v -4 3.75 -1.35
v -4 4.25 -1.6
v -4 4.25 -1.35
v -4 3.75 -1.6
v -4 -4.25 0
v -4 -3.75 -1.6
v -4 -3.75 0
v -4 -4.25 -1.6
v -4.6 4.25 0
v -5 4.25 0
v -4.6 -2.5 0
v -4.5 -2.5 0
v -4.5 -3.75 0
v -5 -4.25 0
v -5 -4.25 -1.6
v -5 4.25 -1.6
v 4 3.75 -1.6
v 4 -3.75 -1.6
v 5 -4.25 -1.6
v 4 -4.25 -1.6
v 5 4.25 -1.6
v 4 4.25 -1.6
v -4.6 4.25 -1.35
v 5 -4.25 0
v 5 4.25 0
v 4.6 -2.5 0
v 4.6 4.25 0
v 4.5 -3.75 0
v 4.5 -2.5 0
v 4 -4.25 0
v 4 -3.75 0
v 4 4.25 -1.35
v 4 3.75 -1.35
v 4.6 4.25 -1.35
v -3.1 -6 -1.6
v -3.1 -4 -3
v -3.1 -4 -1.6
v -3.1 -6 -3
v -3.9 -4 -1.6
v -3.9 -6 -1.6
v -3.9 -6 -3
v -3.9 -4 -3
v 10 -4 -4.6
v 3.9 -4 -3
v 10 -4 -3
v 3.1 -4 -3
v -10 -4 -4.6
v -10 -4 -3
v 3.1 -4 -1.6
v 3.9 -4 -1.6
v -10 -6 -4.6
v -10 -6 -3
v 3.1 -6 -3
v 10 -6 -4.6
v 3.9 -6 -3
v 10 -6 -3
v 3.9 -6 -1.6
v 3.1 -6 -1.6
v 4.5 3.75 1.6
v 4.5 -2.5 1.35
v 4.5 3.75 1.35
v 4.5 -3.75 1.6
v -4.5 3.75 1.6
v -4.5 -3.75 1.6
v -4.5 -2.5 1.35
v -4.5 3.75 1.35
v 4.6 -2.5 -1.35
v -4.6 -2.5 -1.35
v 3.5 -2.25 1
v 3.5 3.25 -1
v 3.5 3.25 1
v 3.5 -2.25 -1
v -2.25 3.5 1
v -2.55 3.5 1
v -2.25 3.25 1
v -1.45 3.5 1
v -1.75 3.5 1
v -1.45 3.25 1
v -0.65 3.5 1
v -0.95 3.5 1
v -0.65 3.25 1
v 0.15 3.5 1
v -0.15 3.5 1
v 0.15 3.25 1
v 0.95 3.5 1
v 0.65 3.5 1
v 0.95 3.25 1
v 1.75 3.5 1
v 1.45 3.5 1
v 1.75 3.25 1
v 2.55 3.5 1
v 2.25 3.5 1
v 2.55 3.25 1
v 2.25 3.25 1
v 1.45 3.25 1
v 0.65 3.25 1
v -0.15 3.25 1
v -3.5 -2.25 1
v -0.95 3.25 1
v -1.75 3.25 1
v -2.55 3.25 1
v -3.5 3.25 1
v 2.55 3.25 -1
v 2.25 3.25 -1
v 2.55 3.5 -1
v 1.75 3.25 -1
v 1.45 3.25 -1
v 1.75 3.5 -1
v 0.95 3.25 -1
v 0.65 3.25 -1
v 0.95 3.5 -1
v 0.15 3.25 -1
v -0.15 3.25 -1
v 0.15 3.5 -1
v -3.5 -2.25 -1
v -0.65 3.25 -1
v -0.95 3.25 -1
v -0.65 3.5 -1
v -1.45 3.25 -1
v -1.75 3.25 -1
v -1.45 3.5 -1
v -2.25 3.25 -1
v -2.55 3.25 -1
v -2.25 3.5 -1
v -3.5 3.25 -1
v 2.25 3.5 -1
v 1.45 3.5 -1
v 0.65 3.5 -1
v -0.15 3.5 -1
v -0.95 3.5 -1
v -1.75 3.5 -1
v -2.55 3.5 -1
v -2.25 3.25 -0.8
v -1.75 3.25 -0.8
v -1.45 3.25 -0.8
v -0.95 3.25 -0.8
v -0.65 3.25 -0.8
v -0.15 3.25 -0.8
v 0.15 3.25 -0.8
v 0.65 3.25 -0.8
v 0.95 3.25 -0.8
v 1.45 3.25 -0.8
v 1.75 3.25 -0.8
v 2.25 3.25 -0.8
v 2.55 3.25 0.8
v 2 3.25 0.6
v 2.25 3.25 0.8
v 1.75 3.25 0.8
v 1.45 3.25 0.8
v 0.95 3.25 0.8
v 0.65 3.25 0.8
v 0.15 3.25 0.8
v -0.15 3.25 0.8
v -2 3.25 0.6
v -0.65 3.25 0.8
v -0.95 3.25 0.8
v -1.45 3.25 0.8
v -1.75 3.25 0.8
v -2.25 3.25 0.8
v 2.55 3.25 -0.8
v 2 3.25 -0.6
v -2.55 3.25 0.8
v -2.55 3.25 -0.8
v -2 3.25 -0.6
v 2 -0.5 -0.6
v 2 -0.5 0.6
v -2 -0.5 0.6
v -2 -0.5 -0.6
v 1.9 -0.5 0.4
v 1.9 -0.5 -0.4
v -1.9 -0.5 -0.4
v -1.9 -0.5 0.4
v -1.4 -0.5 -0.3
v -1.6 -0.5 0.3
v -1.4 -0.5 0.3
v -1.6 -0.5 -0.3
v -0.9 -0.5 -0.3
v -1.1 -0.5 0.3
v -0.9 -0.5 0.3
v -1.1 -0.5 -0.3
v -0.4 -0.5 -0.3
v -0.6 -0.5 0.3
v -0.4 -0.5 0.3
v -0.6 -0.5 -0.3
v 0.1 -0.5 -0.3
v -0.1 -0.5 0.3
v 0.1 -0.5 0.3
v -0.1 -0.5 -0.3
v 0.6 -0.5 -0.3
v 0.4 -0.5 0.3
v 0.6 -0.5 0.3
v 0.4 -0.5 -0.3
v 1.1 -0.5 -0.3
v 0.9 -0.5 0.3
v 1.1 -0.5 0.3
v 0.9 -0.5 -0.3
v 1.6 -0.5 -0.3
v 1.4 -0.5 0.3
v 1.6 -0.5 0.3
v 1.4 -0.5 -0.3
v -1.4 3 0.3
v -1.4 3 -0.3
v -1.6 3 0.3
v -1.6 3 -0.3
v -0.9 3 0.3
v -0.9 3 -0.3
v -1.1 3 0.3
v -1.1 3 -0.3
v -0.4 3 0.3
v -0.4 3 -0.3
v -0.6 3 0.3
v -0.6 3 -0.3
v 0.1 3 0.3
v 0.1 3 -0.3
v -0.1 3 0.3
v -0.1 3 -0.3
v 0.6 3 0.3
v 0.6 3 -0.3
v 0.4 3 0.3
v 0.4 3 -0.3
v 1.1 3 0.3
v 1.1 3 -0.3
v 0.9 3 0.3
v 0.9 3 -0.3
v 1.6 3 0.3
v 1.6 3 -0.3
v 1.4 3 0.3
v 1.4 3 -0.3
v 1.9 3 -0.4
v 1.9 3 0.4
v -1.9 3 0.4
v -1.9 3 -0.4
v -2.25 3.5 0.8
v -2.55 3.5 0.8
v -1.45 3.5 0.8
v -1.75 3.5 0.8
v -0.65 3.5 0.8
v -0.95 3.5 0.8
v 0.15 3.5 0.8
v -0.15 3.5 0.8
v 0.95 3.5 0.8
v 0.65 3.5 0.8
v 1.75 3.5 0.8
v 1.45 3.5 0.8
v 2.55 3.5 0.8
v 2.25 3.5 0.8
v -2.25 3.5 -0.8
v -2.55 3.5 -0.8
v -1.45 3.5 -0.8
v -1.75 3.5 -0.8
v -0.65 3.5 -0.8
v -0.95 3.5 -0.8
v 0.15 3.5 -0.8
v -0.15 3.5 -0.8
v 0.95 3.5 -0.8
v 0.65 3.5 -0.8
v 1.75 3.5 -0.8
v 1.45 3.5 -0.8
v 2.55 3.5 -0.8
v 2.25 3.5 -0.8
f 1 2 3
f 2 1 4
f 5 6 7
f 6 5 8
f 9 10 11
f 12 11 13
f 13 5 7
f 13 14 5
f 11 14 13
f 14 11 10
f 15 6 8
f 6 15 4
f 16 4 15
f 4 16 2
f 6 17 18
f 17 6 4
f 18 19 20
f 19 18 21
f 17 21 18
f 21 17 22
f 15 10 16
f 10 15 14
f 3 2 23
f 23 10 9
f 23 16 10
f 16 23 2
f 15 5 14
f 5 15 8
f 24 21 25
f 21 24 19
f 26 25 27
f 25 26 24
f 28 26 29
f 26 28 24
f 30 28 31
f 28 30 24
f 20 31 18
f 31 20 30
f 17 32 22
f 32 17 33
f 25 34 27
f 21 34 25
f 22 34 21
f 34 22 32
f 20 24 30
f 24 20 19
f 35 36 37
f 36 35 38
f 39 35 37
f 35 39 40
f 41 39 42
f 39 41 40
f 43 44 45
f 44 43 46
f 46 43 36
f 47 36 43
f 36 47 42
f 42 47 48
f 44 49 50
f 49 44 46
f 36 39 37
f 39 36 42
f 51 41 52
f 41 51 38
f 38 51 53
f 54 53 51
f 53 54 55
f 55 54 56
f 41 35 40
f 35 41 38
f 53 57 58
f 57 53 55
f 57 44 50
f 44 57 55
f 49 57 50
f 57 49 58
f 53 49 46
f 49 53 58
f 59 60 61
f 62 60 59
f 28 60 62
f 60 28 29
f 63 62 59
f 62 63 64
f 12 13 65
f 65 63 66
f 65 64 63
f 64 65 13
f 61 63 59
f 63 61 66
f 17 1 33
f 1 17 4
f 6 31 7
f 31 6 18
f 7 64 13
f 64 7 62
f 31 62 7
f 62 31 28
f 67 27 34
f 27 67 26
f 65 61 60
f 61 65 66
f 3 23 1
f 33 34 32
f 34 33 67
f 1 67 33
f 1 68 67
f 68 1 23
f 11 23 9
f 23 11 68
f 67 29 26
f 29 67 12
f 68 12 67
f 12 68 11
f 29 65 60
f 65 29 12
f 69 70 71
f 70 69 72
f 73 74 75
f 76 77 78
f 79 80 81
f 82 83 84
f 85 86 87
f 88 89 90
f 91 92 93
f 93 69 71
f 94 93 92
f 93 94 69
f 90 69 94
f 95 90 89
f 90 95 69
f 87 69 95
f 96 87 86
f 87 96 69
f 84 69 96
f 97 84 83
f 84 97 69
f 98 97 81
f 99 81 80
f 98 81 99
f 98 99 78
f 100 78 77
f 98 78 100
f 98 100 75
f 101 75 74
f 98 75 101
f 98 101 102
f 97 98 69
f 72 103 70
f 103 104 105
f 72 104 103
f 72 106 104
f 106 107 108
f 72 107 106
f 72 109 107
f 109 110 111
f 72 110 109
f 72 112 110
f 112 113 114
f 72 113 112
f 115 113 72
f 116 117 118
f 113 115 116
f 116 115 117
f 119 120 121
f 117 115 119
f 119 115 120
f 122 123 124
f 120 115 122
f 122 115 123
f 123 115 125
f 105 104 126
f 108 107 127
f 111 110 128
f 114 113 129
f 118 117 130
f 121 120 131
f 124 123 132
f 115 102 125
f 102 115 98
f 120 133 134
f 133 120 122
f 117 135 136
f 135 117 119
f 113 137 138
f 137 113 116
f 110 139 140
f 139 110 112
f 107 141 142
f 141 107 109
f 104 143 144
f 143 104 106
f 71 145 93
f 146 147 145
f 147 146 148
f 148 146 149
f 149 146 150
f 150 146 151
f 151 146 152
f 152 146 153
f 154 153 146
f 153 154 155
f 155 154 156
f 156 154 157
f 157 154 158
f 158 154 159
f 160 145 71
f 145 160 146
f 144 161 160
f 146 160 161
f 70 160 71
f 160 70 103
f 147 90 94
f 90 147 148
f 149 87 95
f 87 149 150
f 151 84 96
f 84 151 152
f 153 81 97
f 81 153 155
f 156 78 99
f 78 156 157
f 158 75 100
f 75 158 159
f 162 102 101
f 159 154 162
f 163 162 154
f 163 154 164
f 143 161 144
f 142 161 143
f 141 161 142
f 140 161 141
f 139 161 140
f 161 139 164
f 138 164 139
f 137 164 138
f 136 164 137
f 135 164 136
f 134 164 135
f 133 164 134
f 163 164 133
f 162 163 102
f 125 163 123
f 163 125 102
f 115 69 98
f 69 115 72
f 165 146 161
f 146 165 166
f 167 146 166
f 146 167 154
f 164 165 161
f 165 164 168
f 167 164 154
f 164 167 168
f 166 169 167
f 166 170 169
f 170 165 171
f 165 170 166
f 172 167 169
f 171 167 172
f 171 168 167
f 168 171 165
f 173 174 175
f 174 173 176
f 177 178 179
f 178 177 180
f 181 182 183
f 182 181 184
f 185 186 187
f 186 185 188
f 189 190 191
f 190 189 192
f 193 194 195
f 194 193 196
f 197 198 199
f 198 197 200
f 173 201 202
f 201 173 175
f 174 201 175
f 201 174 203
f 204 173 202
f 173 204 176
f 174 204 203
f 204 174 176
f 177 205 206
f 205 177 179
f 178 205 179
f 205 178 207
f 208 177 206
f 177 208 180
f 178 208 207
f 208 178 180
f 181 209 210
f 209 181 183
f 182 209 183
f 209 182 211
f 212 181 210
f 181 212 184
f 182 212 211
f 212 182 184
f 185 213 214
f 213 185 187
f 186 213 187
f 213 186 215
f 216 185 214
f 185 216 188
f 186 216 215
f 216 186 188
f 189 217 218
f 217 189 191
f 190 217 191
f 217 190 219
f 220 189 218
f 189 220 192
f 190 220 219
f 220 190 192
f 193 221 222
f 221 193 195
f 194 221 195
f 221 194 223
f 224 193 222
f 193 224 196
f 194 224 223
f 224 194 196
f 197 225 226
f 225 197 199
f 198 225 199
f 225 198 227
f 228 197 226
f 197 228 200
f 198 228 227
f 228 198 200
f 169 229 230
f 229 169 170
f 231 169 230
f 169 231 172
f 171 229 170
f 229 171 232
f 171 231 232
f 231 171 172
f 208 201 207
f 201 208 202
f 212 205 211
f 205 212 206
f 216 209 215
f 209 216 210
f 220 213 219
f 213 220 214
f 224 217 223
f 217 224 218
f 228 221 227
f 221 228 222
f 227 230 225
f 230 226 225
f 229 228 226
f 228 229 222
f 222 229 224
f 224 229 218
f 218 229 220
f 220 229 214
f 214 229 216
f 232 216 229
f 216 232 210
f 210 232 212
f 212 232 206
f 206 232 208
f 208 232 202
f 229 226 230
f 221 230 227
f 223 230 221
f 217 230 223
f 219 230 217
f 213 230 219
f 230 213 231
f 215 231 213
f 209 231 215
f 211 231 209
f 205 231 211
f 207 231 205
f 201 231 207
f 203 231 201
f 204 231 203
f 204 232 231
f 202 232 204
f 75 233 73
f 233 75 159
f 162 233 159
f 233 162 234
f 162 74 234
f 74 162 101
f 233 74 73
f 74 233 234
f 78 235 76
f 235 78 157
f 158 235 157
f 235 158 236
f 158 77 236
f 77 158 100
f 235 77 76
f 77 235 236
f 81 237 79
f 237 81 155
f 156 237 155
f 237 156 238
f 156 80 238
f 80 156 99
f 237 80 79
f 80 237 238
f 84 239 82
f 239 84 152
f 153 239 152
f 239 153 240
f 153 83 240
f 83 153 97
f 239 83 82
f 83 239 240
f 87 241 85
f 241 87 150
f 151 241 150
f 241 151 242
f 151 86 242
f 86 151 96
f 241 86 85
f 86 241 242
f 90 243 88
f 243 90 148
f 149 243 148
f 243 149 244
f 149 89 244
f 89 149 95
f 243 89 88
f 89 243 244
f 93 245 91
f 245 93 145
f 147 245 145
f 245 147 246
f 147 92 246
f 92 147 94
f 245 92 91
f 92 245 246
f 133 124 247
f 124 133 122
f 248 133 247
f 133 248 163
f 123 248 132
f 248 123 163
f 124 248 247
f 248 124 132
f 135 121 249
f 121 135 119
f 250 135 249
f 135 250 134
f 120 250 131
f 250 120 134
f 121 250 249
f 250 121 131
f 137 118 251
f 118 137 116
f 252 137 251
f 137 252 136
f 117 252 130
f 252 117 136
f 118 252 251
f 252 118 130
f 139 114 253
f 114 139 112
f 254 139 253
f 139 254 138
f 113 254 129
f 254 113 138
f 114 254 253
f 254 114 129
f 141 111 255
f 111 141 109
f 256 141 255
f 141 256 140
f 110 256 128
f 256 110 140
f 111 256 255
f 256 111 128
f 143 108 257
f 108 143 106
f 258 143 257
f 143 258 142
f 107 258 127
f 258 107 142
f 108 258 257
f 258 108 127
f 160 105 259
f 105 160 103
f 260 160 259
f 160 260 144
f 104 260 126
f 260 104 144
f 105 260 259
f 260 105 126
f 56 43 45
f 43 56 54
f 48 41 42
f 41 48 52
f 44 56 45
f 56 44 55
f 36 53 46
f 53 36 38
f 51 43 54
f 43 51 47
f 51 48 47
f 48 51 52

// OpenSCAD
// JRC-B008 USB-C Female Receptacle Connector
// Dimensions based on standard USB-C receptacle specifications

$fn = 50; // Smoothness of curves

module usb_c_receptacle() {
    difference() {
        // Main body shell
        union() {
            // Outer metal housing
            color("silver")
            translate([0, 0, 0])
            cube([9, 7.5, 3.2], center=true);
            
            // Mounting tabs on sides
            color("silver") {
                translate([-4.5, 0, -0.8])
                cube([1, 8.5, 1.6], center=true);
                
                translate([4.5, 0, -0.8])
                cube([1, 8.5, 1.6], center=true);
            }
            
            // PCB mounting legs
            color("silver") {
                translate([-3.5, -5, -2.4])
                cube([0.8, 2, 1.6], center=true);
                
                translate([3.5, -5, -2.4])
                cube([0.8, 2, 1.6], center=true);
            }
        }
        
        // Main cavity for USB-C plug
        translate([0, 1, 0])
        cube([9.2, 7, 2.7], center=true);
        
        // Front opening
        translate([0, 5, 0])
        cube([9.2, 4, 2.7], center=true);
    }
    
    // Inner plastic insulator
    color("white")
    translate([0, 0.5, 0])
    difference() {
        cube([7, 5.5, 2.0], center=true);
        
        // Center slot for tongue
        translate([0, 1, 0])
        cube([4, 4, 1.2], center=true);
    }
    
    // Metal tongue with pins
    color("gold")
    translate([0, 0.5, 0])
    difference() {
        cube([3.8, 5, 0.8], center=true);
        
        // Pin holes/slots (simplified representation)
        for(i = [-1.5:0.5:1.5]) {
            translate([i, 0, 0])
            cube([0.2, 6, 0.6], center=true);
        }
    }
    
    // Contact pins on top
    color("gold")
    for(i = [-3, -2, -1, 0, 1, 2, 3]) {
        translate([i*0.8, 2, 0.9])
        cube([0.3, 3, 0.2], center=true);
    }
    
    // Contact pins on bottom
    color("gold")
    for(i = [-3, -2, -1, 0, 1, 2, 3]) {
        translate([i*0.8, 2, -0.9])
        cube([0.3, 3, 0.2], center=true);
    }
}

// Render the connector
usb_c_receptacle();

// Optional: Add a base plate to represent PCB
color("green", 0.7)
translate([0, -5, -3.8])
cube([20, 2, 1.6], center=true);

// Add alignment helper
// Uncomment to see dimensions
/*
color("red")
translate([0, -10, 0])
text("USB-C JRC-B008", size=2, halign="center");
*/
